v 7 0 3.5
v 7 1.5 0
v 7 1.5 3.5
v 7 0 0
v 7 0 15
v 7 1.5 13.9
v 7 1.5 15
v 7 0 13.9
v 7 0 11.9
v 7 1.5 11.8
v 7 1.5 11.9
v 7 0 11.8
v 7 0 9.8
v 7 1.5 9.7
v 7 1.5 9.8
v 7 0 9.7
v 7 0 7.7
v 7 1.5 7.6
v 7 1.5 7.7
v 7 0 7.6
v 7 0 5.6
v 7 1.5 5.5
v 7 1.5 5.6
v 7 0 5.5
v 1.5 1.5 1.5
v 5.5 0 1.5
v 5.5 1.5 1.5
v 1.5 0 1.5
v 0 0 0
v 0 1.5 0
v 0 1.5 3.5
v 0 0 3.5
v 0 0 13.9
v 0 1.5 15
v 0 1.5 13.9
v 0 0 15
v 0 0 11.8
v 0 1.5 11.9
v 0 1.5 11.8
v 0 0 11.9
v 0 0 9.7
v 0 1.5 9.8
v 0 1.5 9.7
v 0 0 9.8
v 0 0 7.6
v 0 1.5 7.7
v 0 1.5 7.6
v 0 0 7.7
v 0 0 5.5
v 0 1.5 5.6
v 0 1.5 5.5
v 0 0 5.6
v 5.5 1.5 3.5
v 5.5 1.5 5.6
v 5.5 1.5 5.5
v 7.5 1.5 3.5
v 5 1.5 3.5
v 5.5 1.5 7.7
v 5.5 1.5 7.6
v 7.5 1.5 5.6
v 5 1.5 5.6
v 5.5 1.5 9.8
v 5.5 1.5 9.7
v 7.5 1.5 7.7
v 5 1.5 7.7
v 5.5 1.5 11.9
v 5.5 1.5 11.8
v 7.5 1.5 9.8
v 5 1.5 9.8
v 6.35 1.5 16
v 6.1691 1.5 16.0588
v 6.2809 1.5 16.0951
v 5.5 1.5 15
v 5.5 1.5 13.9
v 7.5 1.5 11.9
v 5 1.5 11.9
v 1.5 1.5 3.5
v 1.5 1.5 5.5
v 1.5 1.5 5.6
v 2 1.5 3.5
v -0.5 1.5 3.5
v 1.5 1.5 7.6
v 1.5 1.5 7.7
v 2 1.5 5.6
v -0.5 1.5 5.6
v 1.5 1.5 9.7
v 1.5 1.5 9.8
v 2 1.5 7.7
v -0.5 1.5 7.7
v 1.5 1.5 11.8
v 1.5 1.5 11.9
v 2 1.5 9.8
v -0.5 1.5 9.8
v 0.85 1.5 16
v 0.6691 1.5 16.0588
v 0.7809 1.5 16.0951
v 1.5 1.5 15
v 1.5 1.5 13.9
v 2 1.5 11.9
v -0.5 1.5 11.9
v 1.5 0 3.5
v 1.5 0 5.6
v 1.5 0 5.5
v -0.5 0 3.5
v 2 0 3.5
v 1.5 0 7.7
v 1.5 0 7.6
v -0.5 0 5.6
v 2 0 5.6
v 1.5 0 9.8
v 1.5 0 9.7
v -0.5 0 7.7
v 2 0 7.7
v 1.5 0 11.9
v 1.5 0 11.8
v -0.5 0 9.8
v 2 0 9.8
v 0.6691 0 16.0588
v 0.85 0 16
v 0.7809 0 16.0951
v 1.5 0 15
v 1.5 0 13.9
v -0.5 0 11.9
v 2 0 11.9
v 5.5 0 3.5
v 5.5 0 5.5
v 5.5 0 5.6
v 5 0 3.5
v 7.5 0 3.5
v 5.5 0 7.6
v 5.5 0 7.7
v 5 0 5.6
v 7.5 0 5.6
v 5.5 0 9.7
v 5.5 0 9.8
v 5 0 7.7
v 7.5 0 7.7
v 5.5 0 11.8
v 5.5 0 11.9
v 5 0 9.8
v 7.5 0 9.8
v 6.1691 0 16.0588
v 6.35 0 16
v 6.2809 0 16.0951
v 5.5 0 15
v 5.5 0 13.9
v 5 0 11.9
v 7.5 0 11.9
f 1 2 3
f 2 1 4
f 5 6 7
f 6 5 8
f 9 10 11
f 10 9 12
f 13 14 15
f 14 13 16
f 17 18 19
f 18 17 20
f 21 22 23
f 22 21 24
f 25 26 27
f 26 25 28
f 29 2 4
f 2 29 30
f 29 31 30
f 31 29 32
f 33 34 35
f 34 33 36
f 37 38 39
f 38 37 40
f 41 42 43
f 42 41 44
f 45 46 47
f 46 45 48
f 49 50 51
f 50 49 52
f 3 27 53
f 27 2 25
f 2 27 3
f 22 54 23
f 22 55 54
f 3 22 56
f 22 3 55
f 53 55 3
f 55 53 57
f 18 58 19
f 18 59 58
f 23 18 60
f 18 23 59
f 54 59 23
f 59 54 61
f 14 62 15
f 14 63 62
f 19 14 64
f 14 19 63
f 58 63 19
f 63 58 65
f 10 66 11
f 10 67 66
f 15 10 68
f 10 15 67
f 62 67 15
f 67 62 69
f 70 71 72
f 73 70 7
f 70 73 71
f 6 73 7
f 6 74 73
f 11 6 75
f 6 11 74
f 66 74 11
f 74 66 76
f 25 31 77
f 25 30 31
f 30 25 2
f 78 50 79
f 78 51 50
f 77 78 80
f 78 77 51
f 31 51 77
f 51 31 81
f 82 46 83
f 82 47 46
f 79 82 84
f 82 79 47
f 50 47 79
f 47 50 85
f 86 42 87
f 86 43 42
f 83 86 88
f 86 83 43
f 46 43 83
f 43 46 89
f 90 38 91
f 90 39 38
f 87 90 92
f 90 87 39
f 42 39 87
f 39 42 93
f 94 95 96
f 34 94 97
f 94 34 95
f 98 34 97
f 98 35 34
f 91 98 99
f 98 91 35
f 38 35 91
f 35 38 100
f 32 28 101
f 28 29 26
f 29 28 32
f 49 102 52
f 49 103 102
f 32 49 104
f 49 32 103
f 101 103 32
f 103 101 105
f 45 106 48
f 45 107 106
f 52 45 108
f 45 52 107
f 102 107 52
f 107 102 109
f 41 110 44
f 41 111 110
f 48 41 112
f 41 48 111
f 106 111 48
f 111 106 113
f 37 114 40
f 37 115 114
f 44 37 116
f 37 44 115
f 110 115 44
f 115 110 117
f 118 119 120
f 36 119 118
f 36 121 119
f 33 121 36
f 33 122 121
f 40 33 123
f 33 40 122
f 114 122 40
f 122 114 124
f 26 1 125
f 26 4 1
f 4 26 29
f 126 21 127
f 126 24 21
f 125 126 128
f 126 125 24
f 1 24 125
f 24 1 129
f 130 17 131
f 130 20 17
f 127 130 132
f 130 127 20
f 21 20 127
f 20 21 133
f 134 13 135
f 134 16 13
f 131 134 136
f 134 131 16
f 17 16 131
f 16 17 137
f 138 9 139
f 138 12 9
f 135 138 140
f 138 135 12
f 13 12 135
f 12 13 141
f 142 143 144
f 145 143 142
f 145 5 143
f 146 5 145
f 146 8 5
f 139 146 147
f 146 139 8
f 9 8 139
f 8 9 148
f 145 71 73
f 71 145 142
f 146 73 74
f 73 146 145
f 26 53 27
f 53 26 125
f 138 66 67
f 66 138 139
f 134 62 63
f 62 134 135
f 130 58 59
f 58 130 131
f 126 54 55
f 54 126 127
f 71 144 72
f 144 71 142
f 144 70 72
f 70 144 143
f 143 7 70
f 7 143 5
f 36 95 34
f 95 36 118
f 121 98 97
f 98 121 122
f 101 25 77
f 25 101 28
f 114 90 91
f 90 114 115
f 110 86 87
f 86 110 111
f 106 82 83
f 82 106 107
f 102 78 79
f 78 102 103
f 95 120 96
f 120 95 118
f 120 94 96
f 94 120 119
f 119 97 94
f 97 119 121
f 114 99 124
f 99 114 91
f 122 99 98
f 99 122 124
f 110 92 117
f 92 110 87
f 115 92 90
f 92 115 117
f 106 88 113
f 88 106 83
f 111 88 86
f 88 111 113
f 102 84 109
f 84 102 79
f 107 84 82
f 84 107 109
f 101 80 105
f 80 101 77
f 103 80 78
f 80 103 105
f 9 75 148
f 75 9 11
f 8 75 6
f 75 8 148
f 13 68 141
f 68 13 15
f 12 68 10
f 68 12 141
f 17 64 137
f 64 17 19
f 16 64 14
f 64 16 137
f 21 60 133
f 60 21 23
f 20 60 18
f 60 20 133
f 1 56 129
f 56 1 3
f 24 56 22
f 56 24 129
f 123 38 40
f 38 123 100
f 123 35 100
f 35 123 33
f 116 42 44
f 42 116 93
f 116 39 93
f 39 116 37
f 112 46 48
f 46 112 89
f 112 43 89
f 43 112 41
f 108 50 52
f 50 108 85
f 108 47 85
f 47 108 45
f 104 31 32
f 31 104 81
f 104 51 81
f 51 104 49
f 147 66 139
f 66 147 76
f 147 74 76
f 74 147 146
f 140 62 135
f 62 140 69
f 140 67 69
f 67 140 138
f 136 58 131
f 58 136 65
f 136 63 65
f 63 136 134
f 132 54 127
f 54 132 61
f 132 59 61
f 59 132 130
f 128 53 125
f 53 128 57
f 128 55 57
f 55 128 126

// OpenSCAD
// we need a U shape with some little teeth to stay in the sagex

inside=4;
height=15;
thickness=1.5;
width=4+2*thickness;
tooth=0.5;
toothDistance=2;

union() {
  cube([width,thickness,thickness]);
  // the legs have the height height
  translate([width-thickness,0,0]) {
    hull() {
      cube([thickness,thickness,height]);
      translate([thickness/2,thickness,height+1]) rotate([90,0,0]) cylinder(h=thickness,d=0.2);
    }
  }
  // edge on top of legs using hull and a sphere
  hull() {
    cube([thickness,thickness,height]);
    translate([thickness/2,thickness,height+1]) rotate([90,0,0]) cylinder(h=thickness,d=0.2);
  }
}

// make a triangle
for (shift = [thickness, thickness*2+inside]) {
translate([shift,thickness,0])
  rotate([90,0,0]) linear_extrude(thickness) {
    for (i=[thickness+2:toothDistance+0.1:height-toothDistance]) {
      translate([0,i,0]) polygon([[0,0],[tooth,0],[0,toothDistance]]);
    }
  }
}

for (shift = [0, thickness+inside]) {
translate([shift,0,0])
  rotate([90,0,180]) linear_extrude(thickness) {
    for (i=[thickness+2:toothDistance+0.1:height-toothDistance]) {
      translate([0,i,0]) polygon([[0,0],[tooth,0],[0,toothDistance]]);
    }
  }
}
